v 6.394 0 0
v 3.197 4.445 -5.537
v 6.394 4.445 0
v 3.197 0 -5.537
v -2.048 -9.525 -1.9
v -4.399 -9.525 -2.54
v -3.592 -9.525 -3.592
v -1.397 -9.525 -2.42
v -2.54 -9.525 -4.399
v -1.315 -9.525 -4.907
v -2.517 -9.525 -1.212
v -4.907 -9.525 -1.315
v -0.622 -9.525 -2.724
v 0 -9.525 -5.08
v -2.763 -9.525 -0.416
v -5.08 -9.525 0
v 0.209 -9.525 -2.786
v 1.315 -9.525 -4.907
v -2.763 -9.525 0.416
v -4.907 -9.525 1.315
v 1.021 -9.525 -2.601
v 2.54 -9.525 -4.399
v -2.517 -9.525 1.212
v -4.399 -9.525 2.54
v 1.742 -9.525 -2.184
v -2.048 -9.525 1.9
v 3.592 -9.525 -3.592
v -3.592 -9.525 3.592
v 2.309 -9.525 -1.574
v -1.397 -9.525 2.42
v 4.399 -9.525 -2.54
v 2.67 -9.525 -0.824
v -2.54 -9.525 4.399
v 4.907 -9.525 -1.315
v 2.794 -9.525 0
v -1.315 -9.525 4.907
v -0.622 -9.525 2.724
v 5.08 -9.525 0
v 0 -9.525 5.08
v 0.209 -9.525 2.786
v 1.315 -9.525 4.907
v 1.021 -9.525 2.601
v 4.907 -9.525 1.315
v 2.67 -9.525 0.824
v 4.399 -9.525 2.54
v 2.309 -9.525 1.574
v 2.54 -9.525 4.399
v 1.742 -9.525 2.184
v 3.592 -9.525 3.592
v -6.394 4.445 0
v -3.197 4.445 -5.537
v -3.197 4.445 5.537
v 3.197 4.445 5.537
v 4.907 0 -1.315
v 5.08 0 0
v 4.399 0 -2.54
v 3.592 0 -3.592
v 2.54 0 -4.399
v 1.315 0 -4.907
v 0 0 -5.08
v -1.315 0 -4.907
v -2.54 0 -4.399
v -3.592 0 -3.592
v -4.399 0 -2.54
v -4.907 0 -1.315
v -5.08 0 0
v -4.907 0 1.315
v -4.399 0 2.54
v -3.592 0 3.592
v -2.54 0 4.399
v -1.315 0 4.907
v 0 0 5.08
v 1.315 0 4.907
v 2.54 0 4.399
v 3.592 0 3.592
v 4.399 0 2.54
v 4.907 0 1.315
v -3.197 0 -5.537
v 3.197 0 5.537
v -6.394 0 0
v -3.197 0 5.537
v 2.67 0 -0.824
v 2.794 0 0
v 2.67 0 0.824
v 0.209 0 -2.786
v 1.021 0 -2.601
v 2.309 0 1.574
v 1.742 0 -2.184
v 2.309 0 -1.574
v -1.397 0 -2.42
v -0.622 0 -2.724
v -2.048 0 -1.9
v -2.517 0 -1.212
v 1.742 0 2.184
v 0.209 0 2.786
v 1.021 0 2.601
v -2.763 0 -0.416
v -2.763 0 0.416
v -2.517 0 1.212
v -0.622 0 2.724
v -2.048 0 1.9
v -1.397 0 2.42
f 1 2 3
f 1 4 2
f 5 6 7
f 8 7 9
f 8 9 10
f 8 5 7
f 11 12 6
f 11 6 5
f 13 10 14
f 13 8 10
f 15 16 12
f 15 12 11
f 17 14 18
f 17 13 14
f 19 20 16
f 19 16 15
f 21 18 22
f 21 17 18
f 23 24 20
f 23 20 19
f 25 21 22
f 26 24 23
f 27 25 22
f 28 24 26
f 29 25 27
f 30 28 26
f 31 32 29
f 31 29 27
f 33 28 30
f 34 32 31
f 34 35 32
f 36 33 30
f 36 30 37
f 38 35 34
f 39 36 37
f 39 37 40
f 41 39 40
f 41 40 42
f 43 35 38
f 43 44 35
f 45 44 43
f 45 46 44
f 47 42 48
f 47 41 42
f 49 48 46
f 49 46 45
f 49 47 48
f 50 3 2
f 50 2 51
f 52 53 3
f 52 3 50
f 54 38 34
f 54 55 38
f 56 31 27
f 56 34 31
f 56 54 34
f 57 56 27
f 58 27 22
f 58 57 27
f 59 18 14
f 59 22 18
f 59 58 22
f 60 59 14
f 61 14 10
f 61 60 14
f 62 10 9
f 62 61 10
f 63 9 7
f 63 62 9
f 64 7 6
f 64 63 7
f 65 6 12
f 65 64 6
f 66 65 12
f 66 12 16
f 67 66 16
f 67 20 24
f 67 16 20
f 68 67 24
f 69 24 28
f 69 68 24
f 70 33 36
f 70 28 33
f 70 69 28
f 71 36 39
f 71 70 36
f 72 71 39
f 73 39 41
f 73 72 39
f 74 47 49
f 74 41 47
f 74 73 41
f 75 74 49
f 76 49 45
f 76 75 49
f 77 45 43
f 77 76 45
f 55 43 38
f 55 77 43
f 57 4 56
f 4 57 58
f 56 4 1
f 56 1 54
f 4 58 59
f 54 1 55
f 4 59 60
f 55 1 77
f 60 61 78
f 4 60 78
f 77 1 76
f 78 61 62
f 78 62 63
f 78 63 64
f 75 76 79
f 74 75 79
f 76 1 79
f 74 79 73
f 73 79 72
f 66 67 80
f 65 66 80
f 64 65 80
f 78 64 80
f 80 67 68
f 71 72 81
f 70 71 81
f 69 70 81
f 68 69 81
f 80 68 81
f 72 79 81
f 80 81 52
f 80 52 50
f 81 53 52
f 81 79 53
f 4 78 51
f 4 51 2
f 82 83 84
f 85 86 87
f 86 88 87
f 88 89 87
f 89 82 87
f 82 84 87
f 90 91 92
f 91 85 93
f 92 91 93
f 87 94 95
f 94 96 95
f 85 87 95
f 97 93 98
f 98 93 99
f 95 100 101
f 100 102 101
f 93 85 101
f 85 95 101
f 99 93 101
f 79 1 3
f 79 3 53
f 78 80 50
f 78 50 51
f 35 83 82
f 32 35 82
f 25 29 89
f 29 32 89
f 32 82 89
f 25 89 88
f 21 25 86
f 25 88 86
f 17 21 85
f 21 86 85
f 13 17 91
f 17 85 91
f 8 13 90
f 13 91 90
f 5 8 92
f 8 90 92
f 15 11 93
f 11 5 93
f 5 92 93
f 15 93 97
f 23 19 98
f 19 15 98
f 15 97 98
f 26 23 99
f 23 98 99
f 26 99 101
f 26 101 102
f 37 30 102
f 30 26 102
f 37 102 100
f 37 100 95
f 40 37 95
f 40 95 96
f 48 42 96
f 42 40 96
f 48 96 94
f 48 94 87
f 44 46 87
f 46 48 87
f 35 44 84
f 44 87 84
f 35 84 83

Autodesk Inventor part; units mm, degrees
ref_plane "YZ Plane" through (0, 0, 0) normal (1, 0, 0) x (0, 1, 0)
ref_plane "XZ Plane" through (0, 0, 0) normal (0, 1, 0) x (-1, 0, 0)
ref_plane "XY Plane" through (0, 0, 0) normal (0, 0, 1) x (1, 0, 0)
sketch "Sketch1" plane through (0, 0, 0) normal (0, 1, 0) x (-1, 0, 0)
  circle A0 centre (0, 0) radius 5.5372 construction
  line L0 (-3.1969, -5.5372) -> (-6.3938, 0)
  line L1 (-6.3938, 0) -> (-3.1969, 5.5372)
  line L2 (-3.1969, 5.5372) -> (3.1969, 5.5372)
  line L3 (3.1969, 5.5372) -> (6.3938, 0)
  line L4 (6.3938, 0) -> (3.1969, -5.5372)
  line L5 (3.1969, -5.5372) -> (-3.1969, -5.5372)
  point P0 (0, -5.5372)
  dimension "d0" = 11.0744
extrude "Extrusion1" add sketch "Sketch1" along normal blind 4.445
sketch "Sketch2" plane through (0, 0, 0) normal (0, -1, 0) x (1, 0, 0)
  circle A0 centre (0, 0) radius 5.08
  circle A1 centre (0, 0) radius 2.794
  dimension "d3" = 10.16
  dimension "d4" = 5.588
extrude "Extrusion2" add sketch "Sketch2" along normal blind 9.525
properties part number "am-2024" material "Brass"
